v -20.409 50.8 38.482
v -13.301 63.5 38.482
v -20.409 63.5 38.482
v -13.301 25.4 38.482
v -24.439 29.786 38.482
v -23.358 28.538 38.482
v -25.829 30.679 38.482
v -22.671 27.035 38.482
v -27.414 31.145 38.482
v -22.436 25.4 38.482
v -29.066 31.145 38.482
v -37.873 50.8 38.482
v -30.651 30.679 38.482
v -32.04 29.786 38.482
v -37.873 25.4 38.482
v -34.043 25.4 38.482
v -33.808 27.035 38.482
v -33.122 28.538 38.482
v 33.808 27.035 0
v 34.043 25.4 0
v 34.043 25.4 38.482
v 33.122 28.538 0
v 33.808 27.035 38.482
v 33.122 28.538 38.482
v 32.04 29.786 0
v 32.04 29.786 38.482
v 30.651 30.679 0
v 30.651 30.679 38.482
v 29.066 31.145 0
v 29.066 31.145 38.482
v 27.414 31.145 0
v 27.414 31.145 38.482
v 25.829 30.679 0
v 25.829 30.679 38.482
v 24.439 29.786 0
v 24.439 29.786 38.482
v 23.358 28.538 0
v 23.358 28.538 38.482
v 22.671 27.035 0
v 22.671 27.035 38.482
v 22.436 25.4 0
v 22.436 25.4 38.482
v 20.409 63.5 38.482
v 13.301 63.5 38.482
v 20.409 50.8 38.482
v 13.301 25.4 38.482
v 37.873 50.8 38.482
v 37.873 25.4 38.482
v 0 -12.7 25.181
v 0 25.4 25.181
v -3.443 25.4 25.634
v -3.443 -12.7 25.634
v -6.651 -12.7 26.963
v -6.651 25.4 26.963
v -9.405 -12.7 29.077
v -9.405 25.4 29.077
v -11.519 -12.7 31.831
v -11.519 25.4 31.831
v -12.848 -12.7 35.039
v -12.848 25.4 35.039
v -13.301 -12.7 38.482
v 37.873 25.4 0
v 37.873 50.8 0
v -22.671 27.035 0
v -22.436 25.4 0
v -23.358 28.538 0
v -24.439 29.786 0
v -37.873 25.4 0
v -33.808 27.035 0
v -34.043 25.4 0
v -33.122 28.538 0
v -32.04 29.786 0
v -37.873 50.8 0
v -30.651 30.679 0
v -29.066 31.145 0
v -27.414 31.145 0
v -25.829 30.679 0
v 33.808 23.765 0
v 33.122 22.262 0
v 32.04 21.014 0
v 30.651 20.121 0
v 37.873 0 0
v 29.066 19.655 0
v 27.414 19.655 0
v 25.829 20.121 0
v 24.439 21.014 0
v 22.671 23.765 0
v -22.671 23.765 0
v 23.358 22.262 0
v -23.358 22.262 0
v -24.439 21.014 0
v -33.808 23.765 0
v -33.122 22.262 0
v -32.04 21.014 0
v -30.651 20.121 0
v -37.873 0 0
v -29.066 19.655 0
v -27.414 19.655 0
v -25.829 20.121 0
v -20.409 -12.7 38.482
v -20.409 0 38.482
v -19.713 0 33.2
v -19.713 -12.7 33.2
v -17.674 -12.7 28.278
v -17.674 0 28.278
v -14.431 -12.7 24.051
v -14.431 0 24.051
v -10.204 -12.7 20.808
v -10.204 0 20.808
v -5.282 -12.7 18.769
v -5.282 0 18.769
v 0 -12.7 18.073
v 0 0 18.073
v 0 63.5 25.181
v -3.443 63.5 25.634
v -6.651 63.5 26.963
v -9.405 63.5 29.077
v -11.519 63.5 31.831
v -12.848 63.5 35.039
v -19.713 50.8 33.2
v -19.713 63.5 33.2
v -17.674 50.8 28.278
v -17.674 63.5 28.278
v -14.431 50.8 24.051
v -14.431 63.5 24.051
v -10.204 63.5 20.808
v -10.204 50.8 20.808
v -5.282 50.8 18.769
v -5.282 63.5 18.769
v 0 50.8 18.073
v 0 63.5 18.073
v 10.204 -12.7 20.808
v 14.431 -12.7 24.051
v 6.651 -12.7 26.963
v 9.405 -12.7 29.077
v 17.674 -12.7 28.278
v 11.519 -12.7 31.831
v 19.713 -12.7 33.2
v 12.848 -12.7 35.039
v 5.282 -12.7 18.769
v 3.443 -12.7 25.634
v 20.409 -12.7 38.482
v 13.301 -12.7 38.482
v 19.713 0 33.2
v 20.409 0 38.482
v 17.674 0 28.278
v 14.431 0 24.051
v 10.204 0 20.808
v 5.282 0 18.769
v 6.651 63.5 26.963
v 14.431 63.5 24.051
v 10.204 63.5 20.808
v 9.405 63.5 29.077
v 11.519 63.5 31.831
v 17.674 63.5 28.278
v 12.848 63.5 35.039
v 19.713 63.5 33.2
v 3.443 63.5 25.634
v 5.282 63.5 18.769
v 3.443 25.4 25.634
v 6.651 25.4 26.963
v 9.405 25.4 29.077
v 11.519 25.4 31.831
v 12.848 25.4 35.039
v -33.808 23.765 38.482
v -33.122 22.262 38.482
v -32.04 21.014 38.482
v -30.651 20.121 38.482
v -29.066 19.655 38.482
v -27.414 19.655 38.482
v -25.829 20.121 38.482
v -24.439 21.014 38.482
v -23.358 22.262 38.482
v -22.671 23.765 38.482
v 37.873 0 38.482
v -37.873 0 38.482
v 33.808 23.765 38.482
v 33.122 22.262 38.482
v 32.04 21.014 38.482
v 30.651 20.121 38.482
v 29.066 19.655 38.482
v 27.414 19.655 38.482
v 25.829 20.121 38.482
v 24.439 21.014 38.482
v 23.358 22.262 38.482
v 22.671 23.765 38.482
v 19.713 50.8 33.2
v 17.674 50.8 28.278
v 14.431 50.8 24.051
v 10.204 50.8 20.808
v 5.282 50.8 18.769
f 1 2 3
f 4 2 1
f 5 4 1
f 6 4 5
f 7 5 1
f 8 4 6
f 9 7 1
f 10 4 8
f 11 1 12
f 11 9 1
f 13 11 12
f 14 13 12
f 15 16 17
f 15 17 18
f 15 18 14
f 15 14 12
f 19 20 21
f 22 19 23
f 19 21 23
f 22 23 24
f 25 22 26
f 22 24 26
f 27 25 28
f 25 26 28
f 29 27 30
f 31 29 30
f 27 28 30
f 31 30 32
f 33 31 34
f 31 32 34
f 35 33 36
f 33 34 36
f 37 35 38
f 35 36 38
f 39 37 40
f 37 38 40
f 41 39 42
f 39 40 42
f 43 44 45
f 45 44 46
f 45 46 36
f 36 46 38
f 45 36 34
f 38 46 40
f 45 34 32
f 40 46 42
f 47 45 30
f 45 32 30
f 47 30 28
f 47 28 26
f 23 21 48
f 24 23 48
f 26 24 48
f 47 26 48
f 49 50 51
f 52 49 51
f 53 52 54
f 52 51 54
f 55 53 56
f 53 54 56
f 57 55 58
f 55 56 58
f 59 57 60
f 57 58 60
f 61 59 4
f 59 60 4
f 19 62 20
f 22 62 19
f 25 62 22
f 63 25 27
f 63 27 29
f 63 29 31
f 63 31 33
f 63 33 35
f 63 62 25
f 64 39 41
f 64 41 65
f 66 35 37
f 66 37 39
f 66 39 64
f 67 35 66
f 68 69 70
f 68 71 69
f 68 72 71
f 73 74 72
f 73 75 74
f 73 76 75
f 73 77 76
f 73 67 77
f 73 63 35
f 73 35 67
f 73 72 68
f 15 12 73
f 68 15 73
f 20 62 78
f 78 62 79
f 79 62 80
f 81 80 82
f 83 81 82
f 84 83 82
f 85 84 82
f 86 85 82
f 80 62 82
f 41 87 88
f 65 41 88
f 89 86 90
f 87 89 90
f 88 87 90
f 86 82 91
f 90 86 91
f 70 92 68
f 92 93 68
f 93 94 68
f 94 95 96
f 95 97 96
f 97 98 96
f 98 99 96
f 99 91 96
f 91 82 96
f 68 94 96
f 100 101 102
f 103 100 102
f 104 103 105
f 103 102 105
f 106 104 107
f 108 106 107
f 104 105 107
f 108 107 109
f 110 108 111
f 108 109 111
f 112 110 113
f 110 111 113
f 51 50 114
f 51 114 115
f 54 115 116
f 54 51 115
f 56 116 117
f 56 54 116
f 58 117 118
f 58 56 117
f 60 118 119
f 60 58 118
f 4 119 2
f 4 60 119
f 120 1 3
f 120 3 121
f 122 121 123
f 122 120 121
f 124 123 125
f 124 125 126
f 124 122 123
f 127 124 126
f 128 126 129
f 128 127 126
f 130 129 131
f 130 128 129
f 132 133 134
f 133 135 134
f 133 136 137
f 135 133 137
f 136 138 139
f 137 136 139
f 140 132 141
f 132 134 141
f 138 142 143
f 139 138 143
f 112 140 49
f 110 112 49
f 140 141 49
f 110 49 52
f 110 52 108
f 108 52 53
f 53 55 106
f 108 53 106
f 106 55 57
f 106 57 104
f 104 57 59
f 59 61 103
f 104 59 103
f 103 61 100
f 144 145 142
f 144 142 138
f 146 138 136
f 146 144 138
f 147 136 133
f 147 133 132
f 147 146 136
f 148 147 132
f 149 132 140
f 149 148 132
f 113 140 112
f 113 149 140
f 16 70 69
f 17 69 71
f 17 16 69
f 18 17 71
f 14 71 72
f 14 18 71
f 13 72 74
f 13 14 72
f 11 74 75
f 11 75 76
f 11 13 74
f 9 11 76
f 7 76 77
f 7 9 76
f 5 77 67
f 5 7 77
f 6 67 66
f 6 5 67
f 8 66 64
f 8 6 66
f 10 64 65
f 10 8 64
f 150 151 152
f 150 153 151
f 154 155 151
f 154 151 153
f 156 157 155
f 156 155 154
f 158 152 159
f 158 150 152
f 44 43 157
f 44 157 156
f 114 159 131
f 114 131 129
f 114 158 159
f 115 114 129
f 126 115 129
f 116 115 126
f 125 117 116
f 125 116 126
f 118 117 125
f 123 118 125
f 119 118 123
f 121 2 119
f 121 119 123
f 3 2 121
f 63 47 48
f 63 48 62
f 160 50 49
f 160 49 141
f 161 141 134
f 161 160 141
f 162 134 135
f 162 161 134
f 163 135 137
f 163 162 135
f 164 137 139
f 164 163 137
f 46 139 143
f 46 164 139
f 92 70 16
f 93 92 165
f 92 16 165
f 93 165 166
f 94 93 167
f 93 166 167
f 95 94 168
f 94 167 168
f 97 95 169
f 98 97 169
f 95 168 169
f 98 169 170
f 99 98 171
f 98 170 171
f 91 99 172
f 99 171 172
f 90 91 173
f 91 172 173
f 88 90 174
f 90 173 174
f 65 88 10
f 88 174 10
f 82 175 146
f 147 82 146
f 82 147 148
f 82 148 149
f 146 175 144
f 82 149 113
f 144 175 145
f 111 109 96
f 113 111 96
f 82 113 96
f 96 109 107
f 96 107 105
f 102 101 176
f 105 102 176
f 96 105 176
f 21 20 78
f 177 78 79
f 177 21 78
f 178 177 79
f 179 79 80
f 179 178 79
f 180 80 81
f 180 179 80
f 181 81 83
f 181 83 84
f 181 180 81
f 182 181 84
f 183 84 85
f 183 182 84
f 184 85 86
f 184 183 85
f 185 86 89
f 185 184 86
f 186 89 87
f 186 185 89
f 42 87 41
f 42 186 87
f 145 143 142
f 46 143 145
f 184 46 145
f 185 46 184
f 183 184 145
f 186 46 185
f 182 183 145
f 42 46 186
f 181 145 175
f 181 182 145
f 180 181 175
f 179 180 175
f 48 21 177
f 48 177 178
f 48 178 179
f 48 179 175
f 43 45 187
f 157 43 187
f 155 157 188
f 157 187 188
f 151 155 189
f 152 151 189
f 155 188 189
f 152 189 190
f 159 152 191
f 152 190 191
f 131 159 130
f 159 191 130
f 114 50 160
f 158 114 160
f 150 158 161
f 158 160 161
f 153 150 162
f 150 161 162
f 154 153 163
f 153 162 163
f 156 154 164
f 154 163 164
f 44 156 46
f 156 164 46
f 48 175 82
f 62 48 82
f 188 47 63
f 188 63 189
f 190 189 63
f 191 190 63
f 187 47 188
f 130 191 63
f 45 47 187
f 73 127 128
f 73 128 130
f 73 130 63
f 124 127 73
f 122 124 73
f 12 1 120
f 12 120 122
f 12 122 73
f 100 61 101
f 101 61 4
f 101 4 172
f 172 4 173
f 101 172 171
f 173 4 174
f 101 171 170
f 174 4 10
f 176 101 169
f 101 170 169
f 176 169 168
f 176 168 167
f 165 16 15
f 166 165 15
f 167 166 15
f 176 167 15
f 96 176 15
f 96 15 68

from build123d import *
from build123d import SkipClean  # not in build123d's __all__

# Parameters (mm, degrees)
F1_DEPTH = 25.4
F2_DEPTH = 12.7
F4_DEPTH = 254


with BuildPart() as f1:
    # F0 (on Front) → F1 (new body)
    with BuildSketch(Plane.XZ):
        with BuildLine():
            Line((-37.8727540374, 38.4819693863), (-37.8727540374, 0))
            Line((-37.8727540374, 0), (0, 0))
            Line((0, 0), (0, 18.0733259767))
            ThreePointArc((0, 18.0733259767), (-14.4310901498, 24.0508792366), (-20.4086434096, 38.4819693863))
            Line((-20.4086434096, 38.4819693863), (-37.8727540374, 38.4819693863))
        make_face()
        with BuildLine():
            Line((-13.3011555299, 38.4819693863), (-20.4086434096, 38.4819693863))
            ThreePointArc((-20.4086434096, 38.4819693863), (-14.4310901498, 24.0508792366), (0, 18.0733259767))
            Line((0, 18.0733259767), (0, 25.1808138564))
            ThreePointArc((0, 25.1808138564), (-9.4053372728, 29.0766321135), (-13.3011555299, 38.4819693863))
        make_face()
    extrude(amount=-F1_DEPTH)

    # F0 (on Front) → F2 (join)
    with BuildSketch(Plane.XZ):
        with BuildLine():
            Line((-13.3011555299, 38.4819693863), (-20.4086434096, 38.4819693863))
            ThreePointArc((-20.4086434096, 38.4819693863), (-14.4310901498, 24.0508792366), (0, 18.0733259767))
            Line((0, 18.0733259767), (0, 25.1808138564))
            ThreePointArc((0, 25.1808138564), (-9.4053372728, 29.0766321135), (-13.3011555299, 38.4819693863))
        make_face()
    extrude(amount=F2_DEPTH)

    # F3 (on face) → F4 (cut)
    with BuildSketch(Plane.XY.offset(38.4819693863)):
        with BuildLine():
            ThreePointArc((-34.0433958918, 25.4), (-28.239807114, 19.5964112222), (-22.4362183362, 25.4))
            Line((-22.4362183362, 25.4), (-34.0433958918, 25.4))
        make_face()
    extrude(amount=-F4_DEPTH, mode=Mode.SUBTRACT)

    # F5: F1 across face


with BuildPart() as f1_1:
    add(f1.part, clean=False)
    add(f1.part.mirror(Plane(origin=(0, 10.3439929045, 13.7080154385), x_dir=(0, 1, 0), z_dir=(1, 0, 0))), clean=False)

    # F6: F1 across face


with BuildPart() as f1_2:
    add(f1_1.part, clean=False)
    with SkipClean():  # cleaning this boolean's faces spoils the solid; the shape is the same uncleaned
        add(f1_1.part.mirror(Plane(origin=(0, 25.4, 16.6331926938), x_dir=(-1, 0, 0), z_dir=(0, 1, 0))), clean=False)


solid = f1_2.part
